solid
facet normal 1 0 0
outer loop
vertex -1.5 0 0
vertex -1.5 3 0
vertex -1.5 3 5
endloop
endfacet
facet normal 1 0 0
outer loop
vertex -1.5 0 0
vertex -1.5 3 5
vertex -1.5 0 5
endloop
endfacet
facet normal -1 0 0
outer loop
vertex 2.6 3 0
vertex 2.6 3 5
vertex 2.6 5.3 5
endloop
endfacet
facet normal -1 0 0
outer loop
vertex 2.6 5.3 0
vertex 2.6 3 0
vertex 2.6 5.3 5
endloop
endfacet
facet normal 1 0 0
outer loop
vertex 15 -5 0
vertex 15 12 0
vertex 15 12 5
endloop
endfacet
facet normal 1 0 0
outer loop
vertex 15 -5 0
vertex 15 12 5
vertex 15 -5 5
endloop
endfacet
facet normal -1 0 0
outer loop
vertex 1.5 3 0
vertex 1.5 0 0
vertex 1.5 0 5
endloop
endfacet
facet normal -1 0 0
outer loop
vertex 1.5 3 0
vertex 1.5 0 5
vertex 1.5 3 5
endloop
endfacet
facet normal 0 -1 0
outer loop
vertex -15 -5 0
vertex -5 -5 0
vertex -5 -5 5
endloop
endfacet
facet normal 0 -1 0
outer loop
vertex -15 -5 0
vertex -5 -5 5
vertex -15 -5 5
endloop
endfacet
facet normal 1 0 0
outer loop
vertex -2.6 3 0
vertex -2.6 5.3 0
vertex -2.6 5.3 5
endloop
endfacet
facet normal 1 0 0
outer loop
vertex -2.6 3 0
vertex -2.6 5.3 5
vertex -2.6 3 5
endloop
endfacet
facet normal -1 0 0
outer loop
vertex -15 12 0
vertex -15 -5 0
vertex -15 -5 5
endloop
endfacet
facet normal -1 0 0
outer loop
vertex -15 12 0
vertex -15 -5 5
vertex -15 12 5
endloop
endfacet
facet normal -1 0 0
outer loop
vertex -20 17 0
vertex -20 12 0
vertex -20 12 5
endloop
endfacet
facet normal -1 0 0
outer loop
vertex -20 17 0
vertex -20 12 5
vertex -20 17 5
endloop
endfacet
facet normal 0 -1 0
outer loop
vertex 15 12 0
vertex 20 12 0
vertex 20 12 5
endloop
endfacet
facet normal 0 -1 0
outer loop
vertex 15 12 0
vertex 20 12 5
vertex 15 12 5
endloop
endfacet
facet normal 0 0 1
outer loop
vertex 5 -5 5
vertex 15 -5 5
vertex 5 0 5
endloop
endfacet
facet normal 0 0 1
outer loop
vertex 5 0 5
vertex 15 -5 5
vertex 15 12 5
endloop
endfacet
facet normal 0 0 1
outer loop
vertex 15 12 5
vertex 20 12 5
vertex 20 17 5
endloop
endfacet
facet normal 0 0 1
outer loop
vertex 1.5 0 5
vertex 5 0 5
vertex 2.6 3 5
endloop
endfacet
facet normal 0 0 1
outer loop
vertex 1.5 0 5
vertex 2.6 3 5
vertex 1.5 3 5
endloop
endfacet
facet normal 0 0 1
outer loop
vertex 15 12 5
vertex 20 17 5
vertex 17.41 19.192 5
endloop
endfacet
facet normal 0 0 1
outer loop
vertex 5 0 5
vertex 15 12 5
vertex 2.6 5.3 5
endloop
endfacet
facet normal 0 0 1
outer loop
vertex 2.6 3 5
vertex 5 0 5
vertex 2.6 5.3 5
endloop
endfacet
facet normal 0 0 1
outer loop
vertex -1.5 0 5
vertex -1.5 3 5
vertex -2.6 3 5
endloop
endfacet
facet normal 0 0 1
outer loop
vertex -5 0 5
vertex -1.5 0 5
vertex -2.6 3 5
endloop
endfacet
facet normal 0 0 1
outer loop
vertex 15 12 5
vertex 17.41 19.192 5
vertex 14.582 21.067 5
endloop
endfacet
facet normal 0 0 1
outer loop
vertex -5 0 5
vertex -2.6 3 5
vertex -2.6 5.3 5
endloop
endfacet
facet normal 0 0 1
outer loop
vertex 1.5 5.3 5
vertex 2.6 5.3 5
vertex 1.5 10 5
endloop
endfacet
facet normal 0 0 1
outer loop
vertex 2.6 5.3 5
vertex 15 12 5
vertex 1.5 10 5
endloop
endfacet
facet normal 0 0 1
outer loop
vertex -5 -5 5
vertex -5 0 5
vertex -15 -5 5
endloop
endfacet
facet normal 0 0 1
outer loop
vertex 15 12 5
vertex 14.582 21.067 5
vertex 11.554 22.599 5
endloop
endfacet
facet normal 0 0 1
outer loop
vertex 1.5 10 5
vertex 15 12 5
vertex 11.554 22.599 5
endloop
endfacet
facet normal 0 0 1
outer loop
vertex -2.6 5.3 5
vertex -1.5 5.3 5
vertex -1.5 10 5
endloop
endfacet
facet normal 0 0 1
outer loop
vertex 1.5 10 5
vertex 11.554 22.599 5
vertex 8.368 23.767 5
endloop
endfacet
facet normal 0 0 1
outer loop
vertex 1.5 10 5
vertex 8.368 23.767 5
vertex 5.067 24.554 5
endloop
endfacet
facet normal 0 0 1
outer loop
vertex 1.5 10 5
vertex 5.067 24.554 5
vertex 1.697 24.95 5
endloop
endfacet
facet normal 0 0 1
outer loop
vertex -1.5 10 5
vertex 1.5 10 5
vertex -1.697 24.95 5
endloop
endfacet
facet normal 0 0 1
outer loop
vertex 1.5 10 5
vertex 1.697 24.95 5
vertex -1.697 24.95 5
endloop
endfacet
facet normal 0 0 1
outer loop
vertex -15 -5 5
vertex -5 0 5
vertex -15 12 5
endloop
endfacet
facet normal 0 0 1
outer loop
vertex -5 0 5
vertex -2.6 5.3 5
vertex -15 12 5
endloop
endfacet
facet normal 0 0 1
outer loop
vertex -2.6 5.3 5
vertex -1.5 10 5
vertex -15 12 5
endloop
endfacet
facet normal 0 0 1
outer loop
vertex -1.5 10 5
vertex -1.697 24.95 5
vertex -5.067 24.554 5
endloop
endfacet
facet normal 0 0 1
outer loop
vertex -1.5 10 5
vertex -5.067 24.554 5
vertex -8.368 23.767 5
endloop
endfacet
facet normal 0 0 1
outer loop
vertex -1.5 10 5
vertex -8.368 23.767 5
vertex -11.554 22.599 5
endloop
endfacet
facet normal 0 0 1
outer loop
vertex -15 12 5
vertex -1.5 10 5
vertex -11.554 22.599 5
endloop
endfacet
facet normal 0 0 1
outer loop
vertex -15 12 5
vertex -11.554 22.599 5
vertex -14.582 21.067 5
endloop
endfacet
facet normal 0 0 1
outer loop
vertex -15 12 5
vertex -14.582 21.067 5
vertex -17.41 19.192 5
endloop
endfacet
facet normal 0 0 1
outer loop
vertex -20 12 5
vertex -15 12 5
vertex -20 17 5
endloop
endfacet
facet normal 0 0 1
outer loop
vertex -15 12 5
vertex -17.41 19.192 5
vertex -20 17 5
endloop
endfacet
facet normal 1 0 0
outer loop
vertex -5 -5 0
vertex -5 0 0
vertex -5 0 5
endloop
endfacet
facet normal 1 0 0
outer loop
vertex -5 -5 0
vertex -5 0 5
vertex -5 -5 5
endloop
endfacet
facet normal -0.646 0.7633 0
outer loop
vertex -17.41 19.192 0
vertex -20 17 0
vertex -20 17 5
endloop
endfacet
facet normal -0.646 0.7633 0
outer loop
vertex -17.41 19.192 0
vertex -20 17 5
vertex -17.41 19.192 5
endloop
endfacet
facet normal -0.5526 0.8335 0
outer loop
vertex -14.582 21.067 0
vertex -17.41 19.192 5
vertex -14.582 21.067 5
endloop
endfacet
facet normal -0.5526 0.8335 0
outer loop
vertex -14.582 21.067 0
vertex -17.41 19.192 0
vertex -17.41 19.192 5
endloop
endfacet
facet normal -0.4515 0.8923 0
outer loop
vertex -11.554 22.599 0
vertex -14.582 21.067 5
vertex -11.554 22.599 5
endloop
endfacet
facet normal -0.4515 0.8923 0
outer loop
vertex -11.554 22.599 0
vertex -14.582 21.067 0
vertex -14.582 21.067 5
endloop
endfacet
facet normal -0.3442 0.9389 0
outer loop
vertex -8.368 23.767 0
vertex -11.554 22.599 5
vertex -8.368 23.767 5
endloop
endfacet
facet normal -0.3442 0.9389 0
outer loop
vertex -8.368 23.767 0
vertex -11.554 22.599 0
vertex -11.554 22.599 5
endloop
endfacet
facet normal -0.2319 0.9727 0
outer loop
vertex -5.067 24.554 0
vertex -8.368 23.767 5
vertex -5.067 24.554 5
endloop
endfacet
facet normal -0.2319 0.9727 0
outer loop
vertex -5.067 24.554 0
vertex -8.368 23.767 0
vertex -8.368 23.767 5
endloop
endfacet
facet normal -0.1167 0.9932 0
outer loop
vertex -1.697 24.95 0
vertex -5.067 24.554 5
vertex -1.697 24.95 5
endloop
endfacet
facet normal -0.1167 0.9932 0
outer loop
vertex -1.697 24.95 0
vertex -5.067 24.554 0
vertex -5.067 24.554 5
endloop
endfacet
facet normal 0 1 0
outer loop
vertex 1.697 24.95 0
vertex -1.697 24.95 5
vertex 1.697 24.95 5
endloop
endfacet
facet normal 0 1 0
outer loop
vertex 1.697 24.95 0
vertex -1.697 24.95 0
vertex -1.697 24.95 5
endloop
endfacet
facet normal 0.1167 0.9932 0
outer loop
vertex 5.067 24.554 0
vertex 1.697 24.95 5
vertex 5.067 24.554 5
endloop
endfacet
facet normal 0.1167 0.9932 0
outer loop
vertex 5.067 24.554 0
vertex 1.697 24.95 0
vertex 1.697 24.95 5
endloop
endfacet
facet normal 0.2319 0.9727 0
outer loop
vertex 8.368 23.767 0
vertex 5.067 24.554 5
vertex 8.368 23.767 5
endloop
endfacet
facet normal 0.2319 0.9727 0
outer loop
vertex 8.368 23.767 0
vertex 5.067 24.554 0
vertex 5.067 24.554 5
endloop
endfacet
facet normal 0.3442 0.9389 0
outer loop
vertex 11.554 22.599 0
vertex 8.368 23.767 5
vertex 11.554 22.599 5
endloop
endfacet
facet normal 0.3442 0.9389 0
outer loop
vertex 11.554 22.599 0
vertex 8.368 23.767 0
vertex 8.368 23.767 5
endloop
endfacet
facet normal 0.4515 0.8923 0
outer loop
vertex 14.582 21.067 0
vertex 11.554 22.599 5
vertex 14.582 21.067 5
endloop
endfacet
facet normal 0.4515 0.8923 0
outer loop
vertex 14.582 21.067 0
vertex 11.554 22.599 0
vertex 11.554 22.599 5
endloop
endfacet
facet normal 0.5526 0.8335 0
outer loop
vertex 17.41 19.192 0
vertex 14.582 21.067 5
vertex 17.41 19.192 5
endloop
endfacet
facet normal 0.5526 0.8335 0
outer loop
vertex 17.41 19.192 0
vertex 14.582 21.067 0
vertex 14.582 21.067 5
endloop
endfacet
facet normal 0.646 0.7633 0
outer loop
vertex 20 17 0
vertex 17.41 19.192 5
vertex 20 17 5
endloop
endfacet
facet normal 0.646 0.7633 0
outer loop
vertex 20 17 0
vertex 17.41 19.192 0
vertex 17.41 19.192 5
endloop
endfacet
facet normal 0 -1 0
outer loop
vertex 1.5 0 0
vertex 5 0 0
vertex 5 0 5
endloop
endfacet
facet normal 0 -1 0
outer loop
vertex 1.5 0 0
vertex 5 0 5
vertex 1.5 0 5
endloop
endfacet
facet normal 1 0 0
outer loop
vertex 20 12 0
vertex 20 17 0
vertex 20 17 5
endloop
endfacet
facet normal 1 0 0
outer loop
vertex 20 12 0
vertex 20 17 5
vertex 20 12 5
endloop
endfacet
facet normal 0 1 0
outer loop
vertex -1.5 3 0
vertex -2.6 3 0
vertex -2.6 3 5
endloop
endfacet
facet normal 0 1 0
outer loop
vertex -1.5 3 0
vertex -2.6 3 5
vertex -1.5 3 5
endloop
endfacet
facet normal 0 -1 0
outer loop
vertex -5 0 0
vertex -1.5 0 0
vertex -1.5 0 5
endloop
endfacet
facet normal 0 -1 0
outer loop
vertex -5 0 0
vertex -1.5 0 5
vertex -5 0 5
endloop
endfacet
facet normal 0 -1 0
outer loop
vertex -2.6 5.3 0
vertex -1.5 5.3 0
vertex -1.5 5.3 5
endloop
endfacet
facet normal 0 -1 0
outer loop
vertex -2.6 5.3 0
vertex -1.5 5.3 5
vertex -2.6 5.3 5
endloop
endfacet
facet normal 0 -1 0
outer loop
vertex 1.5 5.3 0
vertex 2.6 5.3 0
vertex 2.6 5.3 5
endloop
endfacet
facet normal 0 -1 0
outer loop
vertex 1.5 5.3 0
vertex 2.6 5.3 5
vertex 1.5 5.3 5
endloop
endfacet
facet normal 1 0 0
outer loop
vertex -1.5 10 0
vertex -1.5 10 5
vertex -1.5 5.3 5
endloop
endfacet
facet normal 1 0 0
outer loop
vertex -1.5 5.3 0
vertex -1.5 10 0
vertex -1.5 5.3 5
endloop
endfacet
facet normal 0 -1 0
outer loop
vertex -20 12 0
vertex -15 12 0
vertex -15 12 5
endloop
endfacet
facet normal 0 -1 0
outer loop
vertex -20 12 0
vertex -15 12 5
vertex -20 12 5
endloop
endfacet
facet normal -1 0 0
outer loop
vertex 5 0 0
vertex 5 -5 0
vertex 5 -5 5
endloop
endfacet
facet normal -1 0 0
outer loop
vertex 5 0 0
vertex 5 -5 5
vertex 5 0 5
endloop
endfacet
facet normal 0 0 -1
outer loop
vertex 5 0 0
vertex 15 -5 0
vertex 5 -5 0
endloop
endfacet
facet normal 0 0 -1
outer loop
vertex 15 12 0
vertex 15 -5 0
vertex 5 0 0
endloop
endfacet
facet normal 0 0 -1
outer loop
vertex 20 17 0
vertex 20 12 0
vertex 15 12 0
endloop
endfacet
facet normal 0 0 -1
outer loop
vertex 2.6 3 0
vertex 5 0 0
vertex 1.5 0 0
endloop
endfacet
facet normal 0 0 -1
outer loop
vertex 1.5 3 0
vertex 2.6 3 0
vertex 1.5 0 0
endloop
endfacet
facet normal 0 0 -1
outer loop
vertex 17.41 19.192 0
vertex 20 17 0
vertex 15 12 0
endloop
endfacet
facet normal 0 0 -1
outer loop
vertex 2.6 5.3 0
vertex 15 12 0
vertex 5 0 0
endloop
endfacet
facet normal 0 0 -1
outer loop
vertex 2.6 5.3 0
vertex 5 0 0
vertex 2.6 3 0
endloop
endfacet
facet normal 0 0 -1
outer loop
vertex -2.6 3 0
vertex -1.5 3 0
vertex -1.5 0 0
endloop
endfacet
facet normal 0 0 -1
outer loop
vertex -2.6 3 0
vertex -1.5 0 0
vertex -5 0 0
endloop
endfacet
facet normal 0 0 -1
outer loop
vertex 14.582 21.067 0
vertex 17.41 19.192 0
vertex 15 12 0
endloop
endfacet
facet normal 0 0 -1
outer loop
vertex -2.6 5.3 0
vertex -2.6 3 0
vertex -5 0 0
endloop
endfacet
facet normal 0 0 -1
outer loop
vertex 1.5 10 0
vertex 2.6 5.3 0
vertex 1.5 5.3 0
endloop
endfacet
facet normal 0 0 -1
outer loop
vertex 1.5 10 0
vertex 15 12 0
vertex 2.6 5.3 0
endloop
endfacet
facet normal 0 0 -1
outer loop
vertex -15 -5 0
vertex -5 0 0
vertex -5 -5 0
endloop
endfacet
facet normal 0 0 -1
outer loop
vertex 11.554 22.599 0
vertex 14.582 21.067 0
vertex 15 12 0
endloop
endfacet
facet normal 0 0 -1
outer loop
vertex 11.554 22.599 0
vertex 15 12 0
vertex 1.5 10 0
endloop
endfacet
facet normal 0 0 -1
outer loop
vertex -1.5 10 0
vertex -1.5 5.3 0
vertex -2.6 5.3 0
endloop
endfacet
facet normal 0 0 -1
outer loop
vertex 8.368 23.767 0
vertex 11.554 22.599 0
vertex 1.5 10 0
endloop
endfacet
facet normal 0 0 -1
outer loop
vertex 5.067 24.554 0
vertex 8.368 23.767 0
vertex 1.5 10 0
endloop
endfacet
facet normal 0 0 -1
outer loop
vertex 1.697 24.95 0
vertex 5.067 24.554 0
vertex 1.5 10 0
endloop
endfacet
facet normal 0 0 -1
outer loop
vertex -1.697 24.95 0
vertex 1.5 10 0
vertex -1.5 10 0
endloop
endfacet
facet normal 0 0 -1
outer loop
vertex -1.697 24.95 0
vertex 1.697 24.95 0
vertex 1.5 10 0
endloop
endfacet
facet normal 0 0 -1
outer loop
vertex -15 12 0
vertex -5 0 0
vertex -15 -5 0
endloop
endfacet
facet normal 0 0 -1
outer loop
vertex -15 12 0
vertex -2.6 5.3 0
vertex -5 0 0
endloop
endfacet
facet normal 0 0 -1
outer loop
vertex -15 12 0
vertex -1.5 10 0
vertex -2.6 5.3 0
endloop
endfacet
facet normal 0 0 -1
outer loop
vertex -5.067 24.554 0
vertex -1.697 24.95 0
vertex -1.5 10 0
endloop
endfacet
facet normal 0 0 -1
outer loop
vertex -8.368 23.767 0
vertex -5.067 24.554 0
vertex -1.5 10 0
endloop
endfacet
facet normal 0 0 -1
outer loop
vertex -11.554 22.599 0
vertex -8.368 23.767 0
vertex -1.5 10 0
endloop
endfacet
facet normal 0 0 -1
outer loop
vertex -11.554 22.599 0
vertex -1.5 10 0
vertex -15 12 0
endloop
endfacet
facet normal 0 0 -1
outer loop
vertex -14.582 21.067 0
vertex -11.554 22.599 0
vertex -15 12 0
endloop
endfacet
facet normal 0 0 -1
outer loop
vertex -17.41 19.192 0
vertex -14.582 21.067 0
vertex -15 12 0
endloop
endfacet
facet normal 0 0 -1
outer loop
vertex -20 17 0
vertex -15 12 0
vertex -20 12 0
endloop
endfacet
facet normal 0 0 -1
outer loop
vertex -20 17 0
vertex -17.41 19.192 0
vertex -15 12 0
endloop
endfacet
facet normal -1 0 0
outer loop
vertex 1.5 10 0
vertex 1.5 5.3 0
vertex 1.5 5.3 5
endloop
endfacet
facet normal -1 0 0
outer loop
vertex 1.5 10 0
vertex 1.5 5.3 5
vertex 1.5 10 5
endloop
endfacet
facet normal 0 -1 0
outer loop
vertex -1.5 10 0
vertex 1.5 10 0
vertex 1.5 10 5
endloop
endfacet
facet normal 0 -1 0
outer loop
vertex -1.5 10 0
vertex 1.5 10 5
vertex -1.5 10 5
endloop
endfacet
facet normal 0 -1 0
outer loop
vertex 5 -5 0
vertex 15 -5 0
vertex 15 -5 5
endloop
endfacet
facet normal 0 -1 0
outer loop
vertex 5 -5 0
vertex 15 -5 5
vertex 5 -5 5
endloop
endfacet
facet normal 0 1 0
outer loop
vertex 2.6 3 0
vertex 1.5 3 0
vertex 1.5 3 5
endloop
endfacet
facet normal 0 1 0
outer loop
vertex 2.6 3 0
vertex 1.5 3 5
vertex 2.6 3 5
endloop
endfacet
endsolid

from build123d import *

# Parameters (mm, degrees)
BOSS_EXTRU_1_DEPTH = 5


with BuildPart() as part:
    # Esquisse1 → Boss.-Extru.1 (new body)
    with BuildSketch(Plane.XY):
        with BuildLine():
            Line((-1.5, 3), (-1.5, 0))
            Line((-1.5, 0), (-5, 0))
            Line((-5, 0), (-5, -5))
            Line((-5, -5), (-15, -5))
            Line((-15, -5), (-15, 0))
            Line((-15, 0), (-15, 12))
            Line((-15, 12), (-20, 12))
            Line((-20, 12), (-20, 17))
            ThreePointArc((-20, 17), (0, 25), (20, 17))
            Line((20, 17), (20, 12))
            Line((20, 12), (15, 12))
            Line((15, 12), (15, 0))
            Line((15, 0), (15, -5))
            Line((15, -5), (5, -5))
            Line((5, -5), (5, 0))
            Line((5, 0), (1.5, 0))
            Line((1.5, 0), (1.5, 3))
            Line((1.5, 3), (2.6, 3))
            Line((2.6, 3), (2.6, 5.3))
            Line((2.6, 5.3), (1.5, 5.3))
            Line((1.5, 5.3), (1.5, 10))
            Line((1.5, 10), (-1.5, 10))
            Line((-1.5, 10), (-1.5, 5.3))
            Line((-1.5, 5.3), (-2.6, 5.3))
            Line((-2.6, 5.3), (-2.6, 3))
            Line((-2.6, 3), (-1.5, 3))
        make_face()
    extrude(amount=BOSS_EXTRU_1_DEPTH)


solid = part.part
